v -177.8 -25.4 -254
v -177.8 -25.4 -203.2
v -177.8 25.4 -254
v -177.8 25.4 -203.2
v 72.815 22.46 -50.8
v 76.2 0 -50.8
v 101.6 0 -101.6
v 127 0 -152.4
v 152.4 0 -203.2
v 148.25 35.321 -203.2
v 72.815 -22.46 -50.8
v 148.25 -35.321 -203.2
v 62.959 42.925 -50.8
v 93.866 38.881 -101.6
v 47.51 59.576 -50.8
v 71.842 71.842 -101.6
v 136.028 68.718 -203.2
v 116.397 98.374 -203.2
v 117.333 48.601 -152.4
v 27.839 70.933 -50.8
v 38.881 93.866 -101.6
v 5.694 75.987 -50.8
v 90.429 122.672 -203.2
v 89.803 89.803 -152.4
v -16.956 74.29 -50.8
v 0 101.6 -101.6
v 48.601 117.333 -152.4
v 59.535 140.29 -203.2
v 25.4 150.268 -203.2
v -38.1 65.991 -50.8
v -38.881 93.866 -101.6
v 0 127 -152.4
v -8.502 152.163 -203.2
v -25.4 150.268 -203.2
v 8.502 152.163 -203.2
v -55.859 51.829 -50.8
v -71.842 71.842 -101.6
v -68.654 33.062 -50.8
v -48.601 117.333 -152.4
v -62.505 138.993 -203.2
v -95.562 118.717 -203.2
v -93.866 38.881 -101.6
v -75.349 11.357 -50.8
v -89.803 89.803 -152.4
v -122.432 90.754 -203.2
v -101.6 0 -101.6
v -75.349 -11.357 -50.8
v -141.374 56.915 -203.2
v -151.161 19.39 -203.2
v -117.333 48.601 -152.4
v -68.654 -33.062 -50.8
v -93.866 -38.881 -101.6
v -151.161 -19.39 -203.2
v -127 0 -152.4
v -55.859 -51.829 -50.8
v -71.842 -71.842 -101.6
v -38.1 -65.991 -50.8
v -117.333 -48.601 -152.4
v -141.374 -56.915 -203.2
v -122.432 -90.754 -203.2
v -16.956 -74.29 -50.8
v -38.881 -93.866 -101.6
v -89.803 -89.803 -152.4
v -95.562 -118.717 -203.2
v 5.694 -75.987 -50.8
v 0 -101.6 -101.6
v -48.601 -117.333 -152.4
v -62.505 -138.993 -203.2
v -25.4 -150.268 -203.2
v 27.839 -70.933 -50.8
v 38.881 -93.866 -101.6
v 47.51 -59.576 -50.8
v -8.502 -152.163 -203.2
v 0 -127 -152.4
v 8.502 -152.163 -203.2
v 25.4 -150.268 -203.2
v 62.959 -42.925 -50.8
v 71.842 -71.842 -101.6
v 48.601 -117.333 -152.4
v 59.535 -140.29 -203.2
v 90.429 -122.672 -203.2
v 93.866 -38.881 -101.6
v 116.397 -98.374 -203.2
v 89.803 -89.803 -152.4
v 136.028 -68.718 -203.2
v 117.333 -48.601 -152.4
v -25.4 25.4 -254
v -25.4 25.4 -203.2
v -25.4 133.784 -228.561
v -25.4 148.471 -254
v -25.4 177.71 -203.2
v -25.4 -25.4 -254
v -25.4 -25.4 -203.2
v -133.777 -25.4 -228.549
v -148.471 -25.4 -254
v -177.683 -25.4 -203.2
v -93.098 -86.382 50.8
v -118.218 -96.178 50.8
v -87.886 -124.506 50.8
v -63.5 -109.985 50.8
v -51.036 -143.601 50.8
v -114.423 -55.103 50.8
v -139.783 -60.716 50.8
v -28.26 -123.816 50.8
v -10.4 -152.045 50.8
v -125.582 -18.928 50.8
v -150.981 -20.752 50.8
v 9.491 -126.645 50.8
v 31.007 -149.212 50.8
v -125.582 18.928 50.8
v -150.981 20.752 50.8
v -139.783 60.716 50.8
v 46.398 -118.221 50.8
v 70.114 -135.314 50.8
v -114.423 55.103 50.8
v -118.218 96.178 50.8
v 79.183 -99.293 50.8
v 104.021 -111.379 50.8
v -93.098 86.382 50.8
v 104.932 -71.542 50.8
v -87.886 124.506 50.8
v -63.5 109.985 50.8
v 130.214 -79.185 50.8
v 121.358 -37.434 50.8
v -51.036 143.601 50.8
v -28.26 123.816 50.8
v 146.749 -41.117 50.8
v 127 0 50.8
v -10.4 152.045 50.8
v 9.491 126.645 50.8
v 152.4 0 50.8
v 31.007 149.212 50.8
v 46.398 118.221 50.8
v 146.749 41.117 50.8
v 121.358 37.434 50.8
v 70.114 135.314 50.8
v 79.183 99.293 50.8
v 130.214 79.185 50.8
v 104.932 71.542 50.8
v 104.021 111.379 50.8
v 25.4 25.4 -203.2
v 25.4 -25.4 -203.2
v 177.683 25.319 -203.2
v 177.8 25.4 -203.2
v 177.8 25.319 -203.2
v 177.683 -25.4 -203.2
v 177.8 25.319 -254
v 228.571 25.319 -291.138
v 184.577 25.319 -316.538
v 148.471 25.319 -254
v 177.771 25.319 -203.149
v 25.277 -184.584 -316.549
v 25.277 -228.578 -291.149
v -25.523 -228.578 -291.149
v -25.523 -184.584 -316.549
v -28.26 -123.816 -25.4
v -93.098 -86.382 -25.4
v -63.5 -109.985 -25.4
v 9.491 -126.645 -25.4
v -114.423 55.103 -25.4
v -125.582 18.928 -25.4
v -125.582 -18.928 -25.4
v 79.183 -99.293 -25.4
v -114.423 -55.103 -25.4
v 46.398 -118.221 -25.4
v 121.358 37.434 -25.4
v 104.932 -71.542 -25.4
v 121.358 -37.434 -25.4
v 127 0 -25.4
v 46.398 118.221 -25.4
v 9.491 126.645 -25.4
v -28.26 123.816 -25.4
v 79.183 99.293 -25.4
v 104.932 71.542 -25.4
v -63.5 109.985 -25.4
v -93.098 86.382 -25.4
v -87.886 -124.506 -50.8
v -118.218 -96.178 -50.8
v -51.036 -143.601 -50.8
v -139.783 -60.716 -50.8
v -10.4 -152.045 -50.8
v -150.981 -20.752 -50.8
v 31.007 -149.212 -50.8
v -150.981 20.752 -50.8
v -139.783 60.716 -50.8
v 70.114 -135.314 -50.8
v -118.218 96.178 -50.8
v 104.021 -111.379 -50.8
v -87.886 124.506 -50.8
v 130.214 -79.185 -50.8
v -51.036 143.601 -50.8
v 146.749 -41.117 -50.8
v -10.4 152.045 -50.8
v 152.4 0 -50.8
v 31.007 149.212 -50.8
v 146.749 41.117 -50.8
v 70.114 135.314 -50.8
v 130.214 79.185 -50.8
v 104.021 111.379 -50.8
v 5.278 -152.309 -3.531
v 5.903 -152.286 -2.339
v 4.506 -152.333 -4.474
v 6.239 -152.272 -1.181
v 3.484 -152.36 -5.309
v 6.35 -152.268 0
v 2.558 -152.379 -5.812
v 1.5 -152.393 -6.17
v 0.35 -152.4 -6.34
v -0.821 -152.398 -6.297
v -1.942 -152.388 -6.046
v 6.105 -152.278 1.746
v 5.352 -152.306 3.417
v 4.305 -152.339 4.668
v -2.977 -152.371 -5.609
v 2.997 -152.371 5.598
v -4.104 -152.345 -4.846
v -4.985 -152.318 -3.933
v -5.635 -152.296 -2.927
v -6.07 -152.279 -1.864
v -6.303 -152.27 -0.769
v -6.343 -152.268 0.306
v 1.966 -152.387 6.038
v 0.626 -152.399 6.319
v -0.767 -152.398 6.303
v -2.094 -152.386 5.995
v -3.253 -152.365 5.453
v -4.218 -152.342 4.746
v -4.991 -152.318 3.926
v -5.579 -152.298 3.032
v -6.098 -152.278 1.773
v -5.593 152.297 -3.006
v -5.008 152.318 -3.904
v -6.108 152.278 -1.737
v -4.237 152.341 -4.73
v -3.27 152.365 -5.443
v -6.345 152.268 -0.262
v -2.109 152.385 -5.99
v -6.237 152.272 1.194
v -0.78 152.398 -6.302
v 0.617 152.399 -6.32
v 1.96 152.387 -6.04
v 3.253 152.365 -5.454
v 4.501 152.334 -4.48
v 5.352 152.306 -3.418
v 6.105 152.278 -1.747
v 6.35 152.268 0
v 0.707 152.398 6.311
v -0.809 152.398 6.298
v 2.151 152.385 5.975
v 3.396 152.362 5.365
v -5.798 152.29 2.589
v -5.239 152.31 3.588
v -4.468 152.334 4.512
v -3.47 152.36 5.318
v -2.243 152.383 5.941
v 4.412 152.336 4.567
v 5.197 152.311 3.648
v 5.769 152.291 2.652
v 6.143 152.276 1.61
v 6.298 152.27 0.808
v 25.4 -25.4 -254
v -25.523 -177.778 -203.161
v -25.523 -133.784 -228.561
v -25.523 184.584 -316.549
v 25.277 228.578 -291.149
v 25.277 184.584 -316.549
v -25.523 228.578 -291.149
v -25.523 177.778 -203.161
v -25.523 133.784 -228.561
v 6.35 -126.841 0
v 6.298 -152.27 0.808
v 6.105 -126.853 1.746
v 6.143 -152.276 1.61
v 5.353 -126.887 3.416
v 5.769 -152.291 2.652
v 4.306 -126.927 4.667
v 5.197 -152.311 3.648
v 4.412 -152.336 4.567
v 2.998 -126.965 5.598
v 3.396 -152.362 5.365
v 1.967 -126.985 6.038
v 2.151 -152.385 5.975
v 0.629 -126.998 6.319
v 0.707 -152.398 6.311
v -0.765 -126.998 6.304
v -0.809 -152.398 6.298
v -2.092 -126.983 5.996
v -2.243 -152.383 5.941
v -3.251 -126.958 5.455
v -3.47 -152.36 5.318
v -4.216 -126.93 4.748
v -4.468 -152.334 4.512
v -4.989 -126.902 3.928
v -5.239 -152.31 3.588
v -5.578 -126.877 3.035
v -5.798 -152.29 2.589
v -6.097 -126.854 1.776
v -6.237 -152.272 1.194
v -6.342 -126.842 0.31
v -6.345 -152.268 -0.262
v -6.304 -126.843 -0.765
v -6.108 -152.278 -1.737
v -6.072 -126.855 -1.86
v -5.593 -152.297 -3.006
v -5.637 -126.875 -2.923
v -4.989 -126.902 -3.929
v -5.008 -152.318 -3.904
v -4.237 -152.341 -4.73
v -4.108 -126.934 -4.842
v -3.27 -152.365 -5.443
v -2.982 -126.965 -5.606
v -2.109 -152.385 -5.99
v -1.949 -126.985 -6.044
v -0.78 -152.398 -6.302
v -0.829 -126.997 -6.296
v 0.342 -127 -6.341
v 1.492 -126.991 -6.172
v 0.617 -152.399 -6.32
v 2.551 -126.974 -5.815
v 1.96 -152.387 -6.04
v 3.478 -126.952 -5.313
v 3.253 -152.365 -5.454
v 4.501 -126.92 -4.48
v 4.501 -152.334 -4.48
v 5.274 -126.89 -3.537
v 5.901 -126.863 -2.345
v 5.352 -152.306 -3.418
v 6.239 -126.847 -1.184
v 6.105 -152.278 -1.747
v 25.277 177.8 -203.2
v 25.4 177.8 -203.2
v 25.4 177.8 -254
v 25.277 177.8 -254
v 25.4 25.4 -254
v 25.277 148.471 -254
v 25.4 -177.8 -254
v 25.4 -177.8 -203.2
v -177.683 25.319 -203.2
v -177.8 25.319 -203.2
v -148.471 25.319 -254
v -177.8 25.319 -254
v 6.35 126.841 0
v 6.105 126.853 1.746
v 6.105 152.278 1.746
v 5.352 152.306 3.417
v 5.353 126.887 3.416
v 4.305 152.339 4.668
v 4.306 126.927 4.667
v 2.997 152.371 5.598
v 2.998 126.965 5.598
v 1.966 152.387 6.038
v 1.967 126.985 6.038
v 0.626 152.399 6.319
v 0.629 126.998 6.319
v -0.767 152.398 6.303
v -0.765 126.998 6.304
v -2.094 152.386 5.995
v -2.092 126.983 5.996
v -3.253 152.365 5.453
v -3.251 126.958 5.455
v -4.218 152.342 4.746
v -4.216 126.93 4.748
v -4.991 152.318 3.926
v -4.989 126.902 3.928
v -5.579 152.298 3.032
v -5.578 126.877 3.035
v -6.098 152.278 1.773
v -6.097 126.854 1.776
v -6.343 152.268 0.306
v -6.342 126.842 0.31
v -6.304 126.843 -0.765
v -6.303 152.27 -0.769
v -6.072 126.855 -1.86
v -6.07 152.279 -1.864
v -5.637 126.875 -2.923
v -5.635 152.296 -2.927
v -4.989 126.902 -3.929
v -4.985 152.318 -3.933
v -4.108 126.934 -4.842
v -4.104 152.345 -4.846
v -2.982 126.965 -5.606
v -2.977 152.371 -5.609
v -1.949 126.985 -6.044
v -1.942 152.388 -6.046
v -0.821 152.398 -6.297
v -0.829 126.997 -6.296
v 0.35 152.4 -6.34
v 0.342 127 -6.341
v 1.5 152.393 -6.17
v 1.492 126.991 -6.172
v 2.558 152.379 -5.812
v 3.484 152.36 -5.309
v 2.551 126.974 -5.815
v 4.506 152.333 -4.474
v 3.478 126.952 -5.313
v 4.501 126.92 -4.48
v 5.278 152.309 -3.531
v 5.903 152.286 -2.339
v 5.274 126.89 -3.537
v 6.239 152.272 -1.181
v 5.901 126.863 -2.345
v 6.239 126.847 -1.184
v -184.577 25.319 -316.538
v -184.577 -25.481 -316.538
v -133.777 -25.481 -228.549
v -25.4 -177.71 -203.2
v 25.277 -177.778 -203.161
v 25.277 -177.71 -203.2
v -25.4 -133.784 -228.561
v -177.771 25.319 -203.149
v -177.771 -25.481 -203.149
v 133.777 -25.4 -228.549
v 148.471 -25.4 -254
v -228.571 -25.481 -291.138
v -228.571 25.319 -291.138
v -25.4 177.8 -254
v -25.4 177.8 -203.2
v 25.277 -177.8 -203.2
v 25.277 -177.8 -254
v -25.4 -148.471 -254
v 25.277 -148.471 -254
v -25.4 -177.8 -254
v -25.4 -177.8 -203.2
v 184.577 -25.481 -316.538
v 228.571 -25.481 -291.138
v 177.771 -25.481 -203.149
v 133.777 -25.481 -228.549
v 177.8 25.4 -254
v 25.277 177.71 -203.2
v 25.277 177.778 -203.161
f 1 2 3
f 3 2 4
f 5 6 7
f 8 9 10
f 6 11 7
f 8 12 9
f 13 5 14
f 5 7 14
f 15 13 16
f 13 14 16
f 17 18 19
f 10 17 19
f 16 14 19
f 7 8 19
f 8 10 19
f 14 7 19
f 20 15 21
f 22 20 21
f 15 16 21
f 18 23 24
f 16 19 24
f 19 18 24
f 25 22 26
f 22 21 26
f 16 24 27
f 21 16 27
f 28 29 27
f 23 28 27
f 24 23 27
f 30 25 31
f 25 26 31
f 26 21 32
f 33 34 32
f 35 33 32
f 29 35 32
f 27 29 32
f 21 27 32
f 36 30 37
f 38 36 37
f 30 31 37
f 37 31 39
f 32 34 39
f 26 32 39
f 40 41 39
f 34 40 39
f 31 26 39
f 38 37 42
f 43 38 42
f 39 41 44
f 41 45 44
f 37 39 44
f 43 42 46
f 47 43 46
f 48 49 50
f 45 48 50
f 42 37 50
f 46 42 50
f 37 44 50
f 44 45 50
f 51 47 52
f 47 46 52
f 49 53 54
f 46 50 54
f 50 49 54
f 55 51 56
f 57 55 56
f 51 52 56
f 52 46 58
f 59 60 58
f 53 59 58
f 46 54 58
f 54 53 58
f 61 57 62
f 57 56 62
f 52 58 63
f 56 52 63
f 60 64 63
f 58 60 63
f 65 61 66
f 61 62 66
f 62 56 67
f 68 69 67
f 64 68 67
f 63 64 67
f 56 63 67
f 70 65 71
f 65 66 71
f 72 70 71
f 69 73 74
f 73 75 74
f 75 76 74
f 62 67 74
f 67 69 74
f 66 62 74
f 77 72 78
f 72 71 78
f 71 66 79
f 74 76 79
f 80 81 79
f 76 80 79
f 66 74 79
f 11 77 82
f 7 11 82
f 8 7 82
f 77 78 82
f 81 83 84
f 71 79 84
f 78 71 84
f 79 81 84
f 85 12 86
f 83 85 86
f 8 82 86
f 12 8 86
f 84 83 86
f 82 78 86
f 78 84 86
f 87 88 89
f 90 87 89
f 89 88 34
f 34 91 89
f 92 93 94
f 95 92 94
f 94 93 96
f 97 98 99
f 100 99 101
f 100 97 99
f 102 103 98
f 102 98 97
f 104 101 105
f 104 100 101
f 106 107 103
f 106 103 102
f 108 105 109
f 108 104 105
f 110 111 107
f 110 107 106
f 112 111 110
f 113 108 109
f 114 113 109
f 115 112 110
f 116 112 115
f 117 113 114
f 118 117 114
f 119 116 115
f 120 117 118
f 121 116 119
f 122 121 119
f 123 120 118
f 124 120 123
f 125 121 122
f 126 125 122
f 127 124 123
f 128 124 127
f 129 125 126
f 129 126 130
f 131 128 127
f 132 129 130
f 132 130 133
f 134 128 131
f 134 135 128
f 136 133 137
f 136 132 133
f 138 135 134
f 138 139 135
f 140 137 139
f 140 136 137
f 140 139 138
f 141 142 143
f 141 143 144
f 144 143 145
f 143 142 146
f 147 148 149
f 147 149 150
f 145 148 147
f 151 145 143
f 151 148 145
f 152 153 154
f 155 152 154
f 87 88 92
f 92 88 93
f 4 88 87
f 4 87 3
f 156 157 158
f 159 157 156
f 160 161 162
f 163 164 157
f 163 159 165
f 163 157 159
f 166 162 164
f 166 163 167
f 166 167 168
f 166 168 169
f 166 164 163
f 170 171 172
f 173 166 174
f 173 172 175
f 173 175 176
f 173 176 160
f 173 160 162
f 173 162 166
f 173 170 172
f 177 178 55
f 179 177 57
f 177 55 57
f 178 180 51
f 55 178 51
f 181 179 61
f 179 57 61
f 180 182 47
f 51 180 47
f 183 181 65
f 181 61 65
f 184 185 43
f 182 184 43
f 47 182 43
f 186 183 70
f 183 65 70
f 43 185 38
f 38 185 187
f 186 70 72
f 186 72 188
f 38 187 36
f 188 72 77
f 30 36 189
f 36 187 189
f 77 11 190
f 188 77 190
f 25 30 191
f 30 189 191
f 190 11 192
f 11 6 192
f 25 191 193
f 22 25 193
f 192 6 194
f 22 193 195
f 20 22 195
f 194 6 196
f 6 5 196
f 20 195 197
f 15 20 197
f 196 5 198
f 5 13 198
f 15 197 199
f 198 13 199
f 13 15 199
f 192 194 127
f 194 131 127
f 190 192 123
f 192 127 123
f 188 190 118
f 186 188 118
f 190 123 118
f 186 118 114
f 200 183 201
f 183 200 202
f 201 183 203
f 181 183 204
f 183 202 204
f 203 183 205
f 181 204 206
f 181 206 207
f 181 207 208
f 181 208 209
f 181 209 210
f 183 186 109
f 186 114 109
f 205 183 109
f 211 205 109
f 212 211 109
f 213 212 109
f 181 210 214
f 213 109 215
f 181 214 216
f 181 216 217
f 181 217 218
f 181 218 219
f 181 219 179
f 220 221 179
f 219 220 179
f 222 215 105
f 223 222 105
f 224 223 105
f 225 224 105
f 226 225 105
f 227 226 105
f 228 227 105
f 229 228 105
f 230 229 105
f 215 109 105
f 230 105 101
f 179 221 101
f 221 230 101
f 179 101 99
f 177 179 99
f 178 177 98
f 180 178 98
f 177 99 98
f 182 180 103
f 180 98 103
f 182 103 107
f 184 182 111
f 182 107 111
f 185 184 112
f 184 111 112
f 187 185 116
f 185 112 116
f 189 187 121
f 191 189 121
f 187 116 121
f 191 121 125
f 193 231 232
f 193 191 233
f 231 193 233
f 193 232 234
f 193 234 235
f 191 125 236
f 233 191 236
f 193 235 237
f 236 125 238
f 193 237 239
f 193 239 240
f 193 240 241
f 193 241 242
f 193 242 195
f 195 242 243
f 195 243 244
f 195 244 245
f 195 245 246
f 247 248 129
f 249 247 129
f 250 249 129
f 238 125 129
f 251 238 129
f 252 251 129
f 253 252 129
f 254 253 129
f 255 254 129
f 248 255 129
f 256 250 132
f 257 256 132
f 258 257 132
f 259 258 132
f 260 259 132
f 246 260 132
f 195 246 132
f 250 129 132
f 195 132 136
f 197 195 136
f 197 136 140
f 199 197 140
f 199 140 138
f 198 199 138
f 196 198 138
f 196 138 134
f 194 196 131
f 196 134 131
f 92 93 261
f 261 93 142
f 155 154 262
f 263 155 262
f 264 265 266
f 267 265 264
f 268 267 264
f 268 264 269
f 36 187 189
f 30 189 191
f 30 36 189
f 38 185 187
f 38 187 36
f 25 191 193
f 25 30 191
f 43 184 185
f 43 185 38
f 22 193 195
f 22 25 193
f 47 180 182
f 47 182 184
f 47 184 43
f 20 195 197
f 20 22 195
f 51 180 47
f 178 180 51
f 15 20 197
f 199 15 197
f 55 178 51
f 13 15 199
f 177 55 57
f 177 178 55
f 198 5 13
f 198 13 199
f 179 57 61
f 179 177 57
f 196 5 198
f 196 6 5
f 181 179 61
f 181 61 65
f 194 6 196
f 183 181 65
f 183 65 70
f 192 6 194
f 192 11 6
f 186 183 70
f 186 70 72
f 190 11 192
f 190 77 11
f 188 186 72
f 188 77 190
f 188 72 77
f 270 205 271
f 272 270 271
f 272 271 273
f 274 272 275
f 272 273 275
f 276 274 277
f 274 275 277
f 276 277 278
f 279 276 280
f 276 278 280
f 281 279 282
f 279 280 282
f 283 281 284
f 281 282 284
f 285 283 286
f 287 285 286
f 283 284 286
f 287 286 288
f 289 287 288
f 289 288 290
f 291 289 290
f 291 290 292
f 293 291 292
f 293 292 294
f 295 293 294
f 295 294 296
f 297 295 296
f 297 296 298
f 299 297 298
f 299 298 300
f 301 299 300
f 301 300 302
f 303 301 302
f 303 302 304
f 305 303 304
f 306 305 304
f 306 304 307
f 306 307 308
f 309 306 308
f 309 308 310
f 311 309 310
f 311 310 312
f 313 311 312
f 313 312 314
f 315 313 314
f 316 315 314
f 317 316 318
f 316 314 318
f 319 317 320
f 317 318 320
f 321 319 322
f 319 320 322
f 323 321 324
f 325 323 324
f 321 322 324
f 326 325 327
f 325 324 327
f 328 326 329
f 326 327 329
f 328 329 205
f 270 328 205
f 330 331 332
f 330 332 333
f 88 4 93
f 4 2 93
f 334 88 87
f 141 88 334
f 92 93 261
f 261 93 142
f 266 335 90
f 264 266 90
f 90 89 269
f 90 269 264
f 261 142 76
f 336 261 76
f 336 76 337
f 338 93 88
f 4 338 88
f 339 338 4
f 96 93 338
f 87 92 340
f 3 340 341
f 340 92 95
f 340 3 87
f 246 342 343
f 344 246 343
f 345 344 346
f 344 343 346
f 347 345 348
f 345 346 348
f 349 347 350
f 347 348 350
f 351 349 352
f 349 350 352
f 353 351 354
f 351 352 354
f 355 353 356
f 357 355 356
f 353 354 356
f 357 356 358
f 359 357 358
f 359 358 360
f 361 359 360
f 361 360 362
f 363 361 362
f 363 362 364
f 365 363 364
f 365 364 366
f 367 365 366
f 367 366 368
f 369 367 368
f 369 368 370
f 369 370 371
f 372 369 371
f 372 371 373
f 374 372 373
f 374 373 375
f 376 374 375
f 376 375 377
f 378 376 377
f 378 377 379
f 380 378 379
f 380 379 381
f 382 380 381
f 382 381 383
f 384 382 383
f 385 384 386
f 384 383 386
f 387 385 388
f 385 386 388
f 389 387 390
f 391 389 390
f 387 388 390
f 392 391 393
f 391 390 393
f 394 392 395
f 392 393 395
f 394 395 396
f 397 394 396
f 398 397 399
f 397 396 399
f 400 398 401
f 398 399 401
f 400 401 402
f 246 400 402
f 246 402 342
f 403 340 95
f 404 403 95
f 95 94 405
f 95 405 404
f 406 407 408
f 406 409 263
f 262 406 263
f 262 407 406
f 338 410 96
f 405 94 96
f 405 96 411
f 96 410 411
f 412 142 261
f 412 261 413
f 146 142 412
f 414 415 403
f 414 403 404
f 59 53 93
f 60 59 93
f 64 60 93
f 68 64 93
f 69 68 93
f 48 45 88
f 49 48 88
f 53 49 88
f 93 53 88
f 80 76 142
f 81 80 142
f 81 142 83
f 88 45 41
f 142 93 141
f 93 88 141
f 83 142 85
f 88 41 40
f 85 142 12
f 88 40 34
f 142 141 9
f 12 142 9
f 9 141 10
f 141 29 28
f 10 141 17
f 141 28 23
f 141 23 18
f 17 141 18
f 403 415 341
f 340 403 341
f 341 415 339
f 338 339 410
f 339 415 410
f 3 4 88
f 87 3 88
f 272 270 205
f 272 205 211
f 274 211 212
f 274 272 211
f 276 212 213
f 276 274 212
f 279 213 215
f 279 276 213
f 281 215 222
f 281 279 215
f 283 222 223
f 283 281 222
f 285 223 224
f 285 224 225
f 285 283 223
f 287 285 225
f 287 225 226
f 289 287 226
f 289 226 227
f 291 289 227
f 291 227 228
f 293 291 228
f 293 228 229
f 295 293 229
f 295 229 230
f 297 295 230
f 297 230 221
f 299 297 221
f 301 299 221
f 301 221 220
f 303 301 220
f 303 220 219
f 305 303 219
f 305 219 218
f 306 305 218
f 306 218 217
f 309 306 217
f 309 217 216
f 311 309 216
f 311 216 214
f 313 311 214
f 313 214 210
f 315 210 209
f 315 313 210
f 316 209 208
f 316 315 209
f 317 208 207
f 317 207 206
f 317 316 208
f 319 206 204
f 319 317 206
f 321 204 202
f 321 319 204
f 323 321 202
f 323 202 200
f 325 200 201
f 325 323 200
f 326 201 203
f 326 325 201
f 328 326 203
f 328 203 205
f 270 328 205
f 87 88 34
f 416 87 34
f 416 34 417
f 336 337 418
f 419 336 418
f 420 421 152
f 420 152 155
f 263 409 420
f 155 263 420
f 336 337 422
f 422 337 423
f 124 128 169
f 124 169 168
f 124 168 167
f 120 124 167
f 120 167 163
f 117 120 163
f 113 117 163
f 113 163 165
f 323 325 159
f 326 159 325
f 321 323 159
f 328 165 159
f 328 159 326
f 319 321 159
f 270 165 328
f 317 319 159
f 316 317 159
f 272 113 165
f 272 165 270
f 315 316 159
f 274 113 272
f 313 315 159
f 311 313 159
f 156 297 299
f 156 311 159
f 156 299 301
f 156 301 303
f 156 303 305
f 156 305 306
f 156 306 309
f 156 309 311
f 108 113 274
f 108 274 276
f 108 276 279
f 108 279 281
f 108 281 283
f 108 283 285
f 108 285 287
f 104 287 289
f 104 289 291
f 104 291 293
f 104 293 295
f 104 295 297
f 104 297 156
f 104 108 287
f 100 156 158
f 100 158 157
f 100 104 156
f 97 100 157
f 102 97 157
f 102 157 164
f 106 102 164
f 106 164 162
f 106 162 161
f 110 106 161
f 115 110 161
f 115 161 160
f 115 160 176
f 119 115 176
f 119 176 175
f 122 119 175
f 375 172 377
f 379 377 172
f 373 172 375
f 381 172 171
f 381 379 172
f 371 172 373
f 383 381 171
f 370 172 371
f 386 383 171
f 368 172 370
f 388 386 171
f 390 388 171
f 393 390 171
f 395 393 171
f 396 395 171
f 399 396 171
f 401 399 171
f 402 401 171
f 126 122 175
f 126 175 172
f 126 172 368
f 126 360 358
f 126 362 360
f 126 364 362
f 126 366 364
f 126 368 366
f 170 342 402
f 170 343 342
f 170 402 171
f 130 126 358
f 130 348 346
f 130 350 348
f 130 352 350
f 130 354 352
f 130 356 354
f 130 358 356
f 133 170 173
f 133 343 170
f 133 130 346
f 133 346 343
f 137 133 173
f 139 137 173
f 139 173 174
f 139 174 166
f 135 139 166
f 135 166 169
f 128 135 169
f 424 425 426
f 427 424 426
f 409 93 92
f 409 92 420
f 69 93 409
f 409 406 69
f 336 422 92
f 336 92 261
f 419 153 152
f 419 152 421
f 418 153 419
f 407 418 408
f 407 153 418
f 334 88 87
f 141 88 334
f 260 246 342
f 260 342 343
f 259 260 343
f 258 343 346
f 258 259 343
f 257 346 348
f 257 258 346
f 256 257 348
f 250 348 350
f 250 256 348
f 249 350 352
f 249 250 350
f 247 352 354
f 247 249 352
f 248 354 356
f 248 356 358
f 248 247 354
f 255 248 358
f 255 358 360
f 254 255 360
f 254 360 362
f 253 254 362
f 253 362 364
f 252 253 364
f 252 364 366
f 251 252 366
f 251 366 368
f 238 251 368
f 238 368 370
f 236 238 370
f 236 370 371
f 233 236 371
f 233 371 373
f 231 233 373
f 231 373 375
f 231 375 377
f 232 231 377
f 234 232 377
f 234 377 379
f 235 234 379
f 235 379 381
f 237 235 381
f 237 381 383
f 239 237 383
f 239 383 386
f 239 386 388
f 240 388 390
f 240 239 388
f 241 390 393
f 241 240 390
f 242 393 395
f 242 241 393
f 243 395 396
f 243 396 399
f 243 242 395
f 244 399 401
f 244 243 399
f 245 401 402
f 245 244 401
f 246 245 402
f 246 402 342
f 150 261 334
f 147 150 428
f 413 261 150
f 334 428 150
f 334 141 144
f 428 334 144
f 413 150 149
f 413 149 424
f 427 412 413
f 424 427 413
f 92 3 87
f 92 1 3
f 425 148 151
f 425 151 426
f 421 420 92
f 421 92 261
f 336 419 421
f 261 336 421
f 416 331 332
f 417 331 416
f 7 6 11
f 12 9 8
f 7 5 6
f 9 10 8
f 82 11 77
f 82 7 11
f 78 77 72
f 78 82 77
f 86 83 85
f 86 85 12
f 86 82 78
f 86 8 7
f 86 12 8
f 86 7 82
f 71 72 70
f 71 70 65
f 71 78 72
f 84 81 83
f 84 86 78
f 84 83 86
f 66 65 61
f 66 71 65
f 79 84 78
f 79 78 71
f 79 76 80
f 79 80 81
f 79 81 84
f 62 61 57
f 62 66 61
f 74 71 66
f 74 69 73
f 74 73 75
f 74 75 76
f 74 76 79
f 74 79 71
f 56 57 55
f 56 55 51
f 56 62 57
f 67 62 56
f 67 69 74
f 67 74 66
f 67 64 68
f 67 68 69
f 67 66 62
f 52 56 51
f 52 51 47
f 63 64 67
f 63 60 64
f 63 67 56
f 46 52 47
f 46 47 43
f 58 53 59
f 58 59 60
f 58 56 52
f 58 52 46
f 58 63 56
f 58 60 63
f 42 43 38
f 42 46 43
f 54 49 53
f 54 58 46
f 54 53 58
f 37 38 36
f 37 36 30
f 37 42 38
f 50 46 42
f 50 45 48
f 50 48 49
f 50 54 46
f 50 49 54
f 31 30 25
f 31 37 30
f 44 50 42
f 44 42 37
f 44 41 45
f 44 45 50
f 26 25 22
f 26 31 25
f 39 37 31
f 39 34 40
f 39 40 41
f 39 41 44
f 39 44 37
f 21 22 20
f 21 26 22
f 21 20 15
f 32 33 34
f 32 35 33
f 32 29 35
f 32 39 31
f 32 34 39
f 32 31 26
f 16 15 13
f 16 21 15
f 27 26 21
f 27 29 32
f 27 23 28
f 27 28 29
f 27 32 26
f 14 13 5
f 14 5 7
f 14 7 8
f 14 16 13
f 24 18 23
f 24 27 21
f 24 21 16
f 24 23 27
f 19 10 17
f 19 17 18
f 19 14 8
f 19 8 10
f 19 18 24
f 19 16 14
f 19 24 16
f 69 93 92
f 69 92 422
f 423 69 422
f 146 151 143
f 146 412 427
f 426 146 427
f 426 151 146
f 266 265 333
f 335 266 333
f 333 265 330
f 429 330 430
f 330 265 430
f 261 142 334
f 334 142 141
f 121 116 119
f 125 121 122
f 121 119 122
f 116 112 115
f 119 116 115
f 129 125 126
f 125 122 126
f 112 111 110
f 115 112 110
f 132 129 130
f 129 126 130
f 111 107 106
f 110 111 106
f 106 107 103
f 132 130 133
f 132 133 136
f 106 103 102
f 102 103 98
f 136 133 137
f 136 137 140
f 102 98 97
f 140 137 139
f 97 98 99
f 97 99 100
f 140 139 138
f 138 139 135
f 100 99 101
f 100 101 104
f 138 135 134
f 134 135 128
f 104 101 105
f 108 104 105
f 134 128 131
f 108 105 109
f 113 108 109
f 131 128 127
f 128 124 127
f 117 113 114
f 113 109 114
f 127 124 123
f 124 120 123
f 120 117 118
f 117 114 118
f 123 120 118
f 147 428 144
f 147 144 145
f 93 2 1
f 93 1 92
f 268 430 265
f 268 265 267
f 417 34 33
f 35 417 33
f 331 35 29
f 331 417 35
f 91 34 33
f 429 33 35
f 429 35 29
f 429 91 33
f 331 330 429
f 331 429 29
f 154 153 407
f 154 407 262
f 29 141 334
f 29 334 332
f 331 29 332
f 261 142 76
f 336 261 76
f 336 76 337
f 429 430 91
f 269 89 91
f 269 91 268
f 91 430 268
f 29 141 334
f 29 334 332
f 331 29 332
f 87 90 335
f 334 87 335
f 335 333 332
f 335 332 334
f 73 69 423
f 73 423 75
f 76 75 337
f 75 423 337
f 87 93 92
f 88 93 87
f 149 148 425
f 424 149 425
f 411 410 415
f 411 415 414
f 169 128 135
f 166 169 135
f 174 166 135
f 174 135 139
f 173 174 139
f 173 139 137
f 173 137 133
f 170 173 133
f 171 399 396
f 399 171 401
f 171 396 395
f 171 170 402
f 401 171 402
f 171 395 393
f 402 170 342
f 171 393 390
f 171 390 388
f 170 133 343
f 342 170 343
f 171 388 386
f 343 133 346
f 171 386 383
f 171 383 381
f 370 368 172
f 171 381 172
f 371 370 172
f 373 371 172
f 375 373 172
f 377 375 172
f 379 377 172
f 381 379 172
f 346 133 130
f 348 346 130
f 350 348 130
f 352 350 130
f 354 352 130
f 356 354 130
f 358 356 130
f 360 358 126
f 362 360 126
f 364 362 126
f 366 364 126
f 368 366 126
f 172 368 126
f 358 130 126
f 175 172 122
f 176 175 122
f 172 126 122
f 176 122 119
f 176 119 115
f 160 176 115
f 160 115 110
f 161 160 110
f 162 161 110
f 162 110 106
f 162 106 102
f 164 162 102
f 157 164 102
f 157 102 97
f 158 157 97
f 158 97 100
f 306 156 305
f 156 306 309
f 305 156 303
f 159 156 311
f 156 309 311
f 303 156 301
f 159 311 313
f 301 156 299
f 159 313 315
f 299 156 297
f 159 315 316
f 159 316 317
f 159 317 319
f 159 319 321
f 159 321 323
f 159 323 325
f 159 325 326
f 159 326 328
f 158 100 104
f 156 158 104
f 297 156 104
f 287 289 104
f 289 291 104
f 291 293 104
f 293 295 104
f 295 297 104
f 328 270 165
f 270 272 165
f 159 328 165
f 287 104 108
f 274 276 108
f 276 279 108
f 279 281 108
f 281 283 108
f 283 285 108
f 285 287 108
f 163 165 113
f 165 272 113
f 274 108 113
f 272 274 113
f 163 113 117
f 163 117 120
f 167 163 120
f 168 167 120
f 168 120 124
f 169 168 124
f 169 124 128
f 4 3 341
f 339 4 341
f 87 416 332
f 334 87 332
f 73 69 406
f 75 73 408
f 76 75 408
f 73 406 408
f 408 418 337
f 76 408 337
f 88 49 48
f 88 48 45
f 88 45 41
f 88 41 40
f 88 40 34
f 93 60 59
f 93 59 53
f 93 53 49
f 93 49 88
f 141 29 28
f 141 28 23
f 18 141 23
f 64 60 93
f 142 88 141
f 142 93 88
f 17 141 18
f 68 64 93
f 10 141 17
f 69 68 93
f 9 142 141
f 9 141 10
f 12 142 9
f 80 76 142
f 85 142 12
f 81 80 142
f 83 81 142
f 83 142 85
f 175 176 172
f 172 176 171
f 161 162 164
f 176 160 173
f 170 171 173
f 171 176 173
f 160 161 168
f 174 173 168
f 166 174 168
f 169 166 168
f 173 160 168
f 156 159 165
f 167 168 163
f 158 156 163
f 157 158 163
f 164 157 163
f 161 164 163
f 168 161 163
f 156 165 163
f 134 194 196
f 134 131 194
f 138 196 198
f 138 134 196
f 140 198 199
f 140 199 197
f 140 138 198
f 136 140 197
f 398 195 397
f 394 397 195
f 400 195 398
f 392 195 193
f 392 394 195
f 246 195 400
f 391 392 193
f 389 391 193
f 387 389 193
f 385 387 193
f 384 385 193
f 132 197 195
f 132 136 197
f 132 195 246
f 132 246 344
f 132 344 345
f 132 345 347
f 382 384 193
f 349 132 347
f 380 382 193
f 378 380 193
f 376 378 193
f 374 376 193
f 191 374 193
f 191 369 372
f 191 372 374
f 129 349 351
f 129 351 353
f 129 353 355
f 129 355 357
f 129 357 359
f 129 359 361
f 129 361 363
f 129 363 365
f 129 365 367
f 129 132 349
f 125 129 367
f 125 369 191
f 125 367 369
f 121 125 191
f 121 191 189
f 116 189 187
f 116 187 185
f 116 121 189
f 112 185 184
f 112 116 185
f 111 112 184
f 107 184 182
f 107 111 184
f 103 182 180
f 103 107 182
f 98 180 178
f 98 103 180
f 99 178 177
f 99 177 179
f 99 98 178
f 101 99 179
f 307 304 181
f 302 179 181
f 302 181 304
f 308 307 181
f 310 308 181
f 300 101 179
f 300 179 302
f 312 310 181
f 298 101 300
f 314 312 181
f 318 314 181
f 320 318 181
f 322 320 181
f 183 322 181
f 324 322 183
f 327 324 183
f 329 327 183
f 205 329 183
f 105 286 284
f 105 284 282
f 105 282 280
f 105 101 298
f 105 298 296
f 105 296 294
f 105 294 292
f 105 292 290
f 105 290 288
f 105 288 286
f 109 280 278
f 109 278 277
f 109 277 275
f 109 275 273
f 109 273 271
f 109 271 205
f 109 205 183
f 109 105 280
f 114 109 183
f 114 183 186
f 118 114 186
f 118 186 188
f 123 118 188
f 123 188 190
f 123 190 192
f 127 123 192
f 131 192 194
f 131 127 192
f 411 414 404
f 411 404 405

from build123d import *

# Parameters (mm, degrees)
F0_R      = 152.4
F0_R_2    = 127
F1_DEPTH  = 50.8
F3_R      = 6.35
F4_DEPTH  = 304.801
F5_R      = 127
F6_DEPTH  = 76.2
F7_R      = 76.2
F9_R      = 152.4
F11_W     = 25.4
F11_H     = 152.4
F14_DEPTH = 50.8
F11_W_2   = 152.4
F11_H_2   = 25.4
F16_DEPTH = 50.8
F17_DEPTH = 50.8
F19_W     = 50.8
F19_H     = 101.6
F20_DEPTH = 50.8
F24_W     = 50.8
F24_H     = 101.6
F25_DEPTH = 50.8


with BuildPart() as f1:
    # F0 (on Top) → F1 (new body, symmetric)
    with BuildSketch(Plane.XY):
        Circle(F0_R)
        Circle(F0_R_2, mode=Mode.SUBTRACT)
        Circle(F0_R_2)
    extrude(amount=F1_DEPTH, both=True)

    # F3 (on offset) → F4 (cut, through all)
    with BuildSketch(Plane.XZ.offset(152.4)):
        Circle(F3_R)
    extrude(amount=-F4_DEPTH, mode=Mode.SUBTRACT)

    # F5 (on face) → F6 (cut)
    with BuildSketch(Plane.XY.offset(50.8)):
        Circle(F5_R)
    extrude(amount=-F6_DEPTH, mode=Mode.SUBTRACT)

    # F7 (on face) → F10 section 0
    with BuildSketch(Plane(origin=(0, 0, -50.8), x_dir=(1, 0, 0), z_dir=(0, 0, -1))):
        Circle(F7_R)
    # F9 (on offset) → F10 section 1
    with BuildSketch(Plane.XY.offset(-203.2)):
        Circle(F9_R)
    loft()

    # F11 (on face) → F14 (join)
    with BuildSketch(Plane(origin=(0, 0, -203.2), x_dir=(1, 0, 0), z_dir=(0, 0, -1))):
        with Locations((-12.7, 101.6)):
            Rectangle(F11_W, F11_H)
        with Locations((12.7, 101.6)):
            Rectangle(F11_W, F11_H)
    extrude(amount=F14_DEPTH)

    # F15: F1 across plane


with BuildPart() as f1_1:
    add(f1.part)
    add(f1.part.mirror(Plane(origin=(0, 0, -203.2), x_dir=(1, 0, 0), z_dir=(0, -1, 0))))

    # F19 (on face) → F20 (join)
    with BuildSketch(Plane(origin=(0, -45.361819, 26.189658), x_dir=(-1, 0, 0), z_dir=(0, 0.866025, -0.5))):
        with Locations((0.122589, -315.631445)):
            Rectangle(F19_W, F19_H)
    extrude(amount=F20_DEPTH)


with BuildPart() as f16:
    # F11 (on face) → F16 (new body)
    with BuildSketch(Plane(origin=(0, 0, -203.2), x_dir=(1, 0, 0), z_dir=(0, 0, -1))):
        with Locations((-101.6, -12.7)):
            Rectangle(F11_W_2, F11_H_2)
        with Locations((-101.6, 12.7)):
            Rectangle(F11_W_2, F11_H_2)
    extrude(amount=F16_DEPTH)


with BuildPart() as f17:
    # F11 (on face) → F17 (new body)
    with BuildSketch(Plane(origin=(0, 0, -203.2), x_dir=(1, 0, 0), z_dir=(0, 0, -1))):
        with Locations((101.6, -12.7)):
            Rectangle(F11_W_2, F11_H_2)
        with Locations((101.6, 12.7)):
            Rectangle(F11_W_2, F11_H_2)
    extrude(amount=F17_DEPTH)

    # F24 (on face) → F25 (join)
    with BuildSketch(Plane(origin=(45.361819, 0, 26.189658), x_dir=(0, -1, 0), z_dir=(-0.866025, 0, -0.5))):
        with Locations((0.081244, -315.618038)):
            Rectangle(F24_W, F24_H)
    extrude(amount=F25_DEPTH)


with BuildPart() as f21_1:
    # F21: instance of F1
    add(f1_1.part.mirror(Plane(origin=(0, 0, -203.2), x_dir=(1, 0, 0), z_dir=(0, -1, 0))))


with BuildPart() as f26_1:
    # F26: instance of F17
    add(f17.part.mirror(Plane(origin=(0, 0, -203.2), x_dir=(0, 1, 0), z_dir=(1, 0, 0))))


solid = Compound([f1_1.part, f16.part, f17.part, f21_1.part, f26_1.part])
